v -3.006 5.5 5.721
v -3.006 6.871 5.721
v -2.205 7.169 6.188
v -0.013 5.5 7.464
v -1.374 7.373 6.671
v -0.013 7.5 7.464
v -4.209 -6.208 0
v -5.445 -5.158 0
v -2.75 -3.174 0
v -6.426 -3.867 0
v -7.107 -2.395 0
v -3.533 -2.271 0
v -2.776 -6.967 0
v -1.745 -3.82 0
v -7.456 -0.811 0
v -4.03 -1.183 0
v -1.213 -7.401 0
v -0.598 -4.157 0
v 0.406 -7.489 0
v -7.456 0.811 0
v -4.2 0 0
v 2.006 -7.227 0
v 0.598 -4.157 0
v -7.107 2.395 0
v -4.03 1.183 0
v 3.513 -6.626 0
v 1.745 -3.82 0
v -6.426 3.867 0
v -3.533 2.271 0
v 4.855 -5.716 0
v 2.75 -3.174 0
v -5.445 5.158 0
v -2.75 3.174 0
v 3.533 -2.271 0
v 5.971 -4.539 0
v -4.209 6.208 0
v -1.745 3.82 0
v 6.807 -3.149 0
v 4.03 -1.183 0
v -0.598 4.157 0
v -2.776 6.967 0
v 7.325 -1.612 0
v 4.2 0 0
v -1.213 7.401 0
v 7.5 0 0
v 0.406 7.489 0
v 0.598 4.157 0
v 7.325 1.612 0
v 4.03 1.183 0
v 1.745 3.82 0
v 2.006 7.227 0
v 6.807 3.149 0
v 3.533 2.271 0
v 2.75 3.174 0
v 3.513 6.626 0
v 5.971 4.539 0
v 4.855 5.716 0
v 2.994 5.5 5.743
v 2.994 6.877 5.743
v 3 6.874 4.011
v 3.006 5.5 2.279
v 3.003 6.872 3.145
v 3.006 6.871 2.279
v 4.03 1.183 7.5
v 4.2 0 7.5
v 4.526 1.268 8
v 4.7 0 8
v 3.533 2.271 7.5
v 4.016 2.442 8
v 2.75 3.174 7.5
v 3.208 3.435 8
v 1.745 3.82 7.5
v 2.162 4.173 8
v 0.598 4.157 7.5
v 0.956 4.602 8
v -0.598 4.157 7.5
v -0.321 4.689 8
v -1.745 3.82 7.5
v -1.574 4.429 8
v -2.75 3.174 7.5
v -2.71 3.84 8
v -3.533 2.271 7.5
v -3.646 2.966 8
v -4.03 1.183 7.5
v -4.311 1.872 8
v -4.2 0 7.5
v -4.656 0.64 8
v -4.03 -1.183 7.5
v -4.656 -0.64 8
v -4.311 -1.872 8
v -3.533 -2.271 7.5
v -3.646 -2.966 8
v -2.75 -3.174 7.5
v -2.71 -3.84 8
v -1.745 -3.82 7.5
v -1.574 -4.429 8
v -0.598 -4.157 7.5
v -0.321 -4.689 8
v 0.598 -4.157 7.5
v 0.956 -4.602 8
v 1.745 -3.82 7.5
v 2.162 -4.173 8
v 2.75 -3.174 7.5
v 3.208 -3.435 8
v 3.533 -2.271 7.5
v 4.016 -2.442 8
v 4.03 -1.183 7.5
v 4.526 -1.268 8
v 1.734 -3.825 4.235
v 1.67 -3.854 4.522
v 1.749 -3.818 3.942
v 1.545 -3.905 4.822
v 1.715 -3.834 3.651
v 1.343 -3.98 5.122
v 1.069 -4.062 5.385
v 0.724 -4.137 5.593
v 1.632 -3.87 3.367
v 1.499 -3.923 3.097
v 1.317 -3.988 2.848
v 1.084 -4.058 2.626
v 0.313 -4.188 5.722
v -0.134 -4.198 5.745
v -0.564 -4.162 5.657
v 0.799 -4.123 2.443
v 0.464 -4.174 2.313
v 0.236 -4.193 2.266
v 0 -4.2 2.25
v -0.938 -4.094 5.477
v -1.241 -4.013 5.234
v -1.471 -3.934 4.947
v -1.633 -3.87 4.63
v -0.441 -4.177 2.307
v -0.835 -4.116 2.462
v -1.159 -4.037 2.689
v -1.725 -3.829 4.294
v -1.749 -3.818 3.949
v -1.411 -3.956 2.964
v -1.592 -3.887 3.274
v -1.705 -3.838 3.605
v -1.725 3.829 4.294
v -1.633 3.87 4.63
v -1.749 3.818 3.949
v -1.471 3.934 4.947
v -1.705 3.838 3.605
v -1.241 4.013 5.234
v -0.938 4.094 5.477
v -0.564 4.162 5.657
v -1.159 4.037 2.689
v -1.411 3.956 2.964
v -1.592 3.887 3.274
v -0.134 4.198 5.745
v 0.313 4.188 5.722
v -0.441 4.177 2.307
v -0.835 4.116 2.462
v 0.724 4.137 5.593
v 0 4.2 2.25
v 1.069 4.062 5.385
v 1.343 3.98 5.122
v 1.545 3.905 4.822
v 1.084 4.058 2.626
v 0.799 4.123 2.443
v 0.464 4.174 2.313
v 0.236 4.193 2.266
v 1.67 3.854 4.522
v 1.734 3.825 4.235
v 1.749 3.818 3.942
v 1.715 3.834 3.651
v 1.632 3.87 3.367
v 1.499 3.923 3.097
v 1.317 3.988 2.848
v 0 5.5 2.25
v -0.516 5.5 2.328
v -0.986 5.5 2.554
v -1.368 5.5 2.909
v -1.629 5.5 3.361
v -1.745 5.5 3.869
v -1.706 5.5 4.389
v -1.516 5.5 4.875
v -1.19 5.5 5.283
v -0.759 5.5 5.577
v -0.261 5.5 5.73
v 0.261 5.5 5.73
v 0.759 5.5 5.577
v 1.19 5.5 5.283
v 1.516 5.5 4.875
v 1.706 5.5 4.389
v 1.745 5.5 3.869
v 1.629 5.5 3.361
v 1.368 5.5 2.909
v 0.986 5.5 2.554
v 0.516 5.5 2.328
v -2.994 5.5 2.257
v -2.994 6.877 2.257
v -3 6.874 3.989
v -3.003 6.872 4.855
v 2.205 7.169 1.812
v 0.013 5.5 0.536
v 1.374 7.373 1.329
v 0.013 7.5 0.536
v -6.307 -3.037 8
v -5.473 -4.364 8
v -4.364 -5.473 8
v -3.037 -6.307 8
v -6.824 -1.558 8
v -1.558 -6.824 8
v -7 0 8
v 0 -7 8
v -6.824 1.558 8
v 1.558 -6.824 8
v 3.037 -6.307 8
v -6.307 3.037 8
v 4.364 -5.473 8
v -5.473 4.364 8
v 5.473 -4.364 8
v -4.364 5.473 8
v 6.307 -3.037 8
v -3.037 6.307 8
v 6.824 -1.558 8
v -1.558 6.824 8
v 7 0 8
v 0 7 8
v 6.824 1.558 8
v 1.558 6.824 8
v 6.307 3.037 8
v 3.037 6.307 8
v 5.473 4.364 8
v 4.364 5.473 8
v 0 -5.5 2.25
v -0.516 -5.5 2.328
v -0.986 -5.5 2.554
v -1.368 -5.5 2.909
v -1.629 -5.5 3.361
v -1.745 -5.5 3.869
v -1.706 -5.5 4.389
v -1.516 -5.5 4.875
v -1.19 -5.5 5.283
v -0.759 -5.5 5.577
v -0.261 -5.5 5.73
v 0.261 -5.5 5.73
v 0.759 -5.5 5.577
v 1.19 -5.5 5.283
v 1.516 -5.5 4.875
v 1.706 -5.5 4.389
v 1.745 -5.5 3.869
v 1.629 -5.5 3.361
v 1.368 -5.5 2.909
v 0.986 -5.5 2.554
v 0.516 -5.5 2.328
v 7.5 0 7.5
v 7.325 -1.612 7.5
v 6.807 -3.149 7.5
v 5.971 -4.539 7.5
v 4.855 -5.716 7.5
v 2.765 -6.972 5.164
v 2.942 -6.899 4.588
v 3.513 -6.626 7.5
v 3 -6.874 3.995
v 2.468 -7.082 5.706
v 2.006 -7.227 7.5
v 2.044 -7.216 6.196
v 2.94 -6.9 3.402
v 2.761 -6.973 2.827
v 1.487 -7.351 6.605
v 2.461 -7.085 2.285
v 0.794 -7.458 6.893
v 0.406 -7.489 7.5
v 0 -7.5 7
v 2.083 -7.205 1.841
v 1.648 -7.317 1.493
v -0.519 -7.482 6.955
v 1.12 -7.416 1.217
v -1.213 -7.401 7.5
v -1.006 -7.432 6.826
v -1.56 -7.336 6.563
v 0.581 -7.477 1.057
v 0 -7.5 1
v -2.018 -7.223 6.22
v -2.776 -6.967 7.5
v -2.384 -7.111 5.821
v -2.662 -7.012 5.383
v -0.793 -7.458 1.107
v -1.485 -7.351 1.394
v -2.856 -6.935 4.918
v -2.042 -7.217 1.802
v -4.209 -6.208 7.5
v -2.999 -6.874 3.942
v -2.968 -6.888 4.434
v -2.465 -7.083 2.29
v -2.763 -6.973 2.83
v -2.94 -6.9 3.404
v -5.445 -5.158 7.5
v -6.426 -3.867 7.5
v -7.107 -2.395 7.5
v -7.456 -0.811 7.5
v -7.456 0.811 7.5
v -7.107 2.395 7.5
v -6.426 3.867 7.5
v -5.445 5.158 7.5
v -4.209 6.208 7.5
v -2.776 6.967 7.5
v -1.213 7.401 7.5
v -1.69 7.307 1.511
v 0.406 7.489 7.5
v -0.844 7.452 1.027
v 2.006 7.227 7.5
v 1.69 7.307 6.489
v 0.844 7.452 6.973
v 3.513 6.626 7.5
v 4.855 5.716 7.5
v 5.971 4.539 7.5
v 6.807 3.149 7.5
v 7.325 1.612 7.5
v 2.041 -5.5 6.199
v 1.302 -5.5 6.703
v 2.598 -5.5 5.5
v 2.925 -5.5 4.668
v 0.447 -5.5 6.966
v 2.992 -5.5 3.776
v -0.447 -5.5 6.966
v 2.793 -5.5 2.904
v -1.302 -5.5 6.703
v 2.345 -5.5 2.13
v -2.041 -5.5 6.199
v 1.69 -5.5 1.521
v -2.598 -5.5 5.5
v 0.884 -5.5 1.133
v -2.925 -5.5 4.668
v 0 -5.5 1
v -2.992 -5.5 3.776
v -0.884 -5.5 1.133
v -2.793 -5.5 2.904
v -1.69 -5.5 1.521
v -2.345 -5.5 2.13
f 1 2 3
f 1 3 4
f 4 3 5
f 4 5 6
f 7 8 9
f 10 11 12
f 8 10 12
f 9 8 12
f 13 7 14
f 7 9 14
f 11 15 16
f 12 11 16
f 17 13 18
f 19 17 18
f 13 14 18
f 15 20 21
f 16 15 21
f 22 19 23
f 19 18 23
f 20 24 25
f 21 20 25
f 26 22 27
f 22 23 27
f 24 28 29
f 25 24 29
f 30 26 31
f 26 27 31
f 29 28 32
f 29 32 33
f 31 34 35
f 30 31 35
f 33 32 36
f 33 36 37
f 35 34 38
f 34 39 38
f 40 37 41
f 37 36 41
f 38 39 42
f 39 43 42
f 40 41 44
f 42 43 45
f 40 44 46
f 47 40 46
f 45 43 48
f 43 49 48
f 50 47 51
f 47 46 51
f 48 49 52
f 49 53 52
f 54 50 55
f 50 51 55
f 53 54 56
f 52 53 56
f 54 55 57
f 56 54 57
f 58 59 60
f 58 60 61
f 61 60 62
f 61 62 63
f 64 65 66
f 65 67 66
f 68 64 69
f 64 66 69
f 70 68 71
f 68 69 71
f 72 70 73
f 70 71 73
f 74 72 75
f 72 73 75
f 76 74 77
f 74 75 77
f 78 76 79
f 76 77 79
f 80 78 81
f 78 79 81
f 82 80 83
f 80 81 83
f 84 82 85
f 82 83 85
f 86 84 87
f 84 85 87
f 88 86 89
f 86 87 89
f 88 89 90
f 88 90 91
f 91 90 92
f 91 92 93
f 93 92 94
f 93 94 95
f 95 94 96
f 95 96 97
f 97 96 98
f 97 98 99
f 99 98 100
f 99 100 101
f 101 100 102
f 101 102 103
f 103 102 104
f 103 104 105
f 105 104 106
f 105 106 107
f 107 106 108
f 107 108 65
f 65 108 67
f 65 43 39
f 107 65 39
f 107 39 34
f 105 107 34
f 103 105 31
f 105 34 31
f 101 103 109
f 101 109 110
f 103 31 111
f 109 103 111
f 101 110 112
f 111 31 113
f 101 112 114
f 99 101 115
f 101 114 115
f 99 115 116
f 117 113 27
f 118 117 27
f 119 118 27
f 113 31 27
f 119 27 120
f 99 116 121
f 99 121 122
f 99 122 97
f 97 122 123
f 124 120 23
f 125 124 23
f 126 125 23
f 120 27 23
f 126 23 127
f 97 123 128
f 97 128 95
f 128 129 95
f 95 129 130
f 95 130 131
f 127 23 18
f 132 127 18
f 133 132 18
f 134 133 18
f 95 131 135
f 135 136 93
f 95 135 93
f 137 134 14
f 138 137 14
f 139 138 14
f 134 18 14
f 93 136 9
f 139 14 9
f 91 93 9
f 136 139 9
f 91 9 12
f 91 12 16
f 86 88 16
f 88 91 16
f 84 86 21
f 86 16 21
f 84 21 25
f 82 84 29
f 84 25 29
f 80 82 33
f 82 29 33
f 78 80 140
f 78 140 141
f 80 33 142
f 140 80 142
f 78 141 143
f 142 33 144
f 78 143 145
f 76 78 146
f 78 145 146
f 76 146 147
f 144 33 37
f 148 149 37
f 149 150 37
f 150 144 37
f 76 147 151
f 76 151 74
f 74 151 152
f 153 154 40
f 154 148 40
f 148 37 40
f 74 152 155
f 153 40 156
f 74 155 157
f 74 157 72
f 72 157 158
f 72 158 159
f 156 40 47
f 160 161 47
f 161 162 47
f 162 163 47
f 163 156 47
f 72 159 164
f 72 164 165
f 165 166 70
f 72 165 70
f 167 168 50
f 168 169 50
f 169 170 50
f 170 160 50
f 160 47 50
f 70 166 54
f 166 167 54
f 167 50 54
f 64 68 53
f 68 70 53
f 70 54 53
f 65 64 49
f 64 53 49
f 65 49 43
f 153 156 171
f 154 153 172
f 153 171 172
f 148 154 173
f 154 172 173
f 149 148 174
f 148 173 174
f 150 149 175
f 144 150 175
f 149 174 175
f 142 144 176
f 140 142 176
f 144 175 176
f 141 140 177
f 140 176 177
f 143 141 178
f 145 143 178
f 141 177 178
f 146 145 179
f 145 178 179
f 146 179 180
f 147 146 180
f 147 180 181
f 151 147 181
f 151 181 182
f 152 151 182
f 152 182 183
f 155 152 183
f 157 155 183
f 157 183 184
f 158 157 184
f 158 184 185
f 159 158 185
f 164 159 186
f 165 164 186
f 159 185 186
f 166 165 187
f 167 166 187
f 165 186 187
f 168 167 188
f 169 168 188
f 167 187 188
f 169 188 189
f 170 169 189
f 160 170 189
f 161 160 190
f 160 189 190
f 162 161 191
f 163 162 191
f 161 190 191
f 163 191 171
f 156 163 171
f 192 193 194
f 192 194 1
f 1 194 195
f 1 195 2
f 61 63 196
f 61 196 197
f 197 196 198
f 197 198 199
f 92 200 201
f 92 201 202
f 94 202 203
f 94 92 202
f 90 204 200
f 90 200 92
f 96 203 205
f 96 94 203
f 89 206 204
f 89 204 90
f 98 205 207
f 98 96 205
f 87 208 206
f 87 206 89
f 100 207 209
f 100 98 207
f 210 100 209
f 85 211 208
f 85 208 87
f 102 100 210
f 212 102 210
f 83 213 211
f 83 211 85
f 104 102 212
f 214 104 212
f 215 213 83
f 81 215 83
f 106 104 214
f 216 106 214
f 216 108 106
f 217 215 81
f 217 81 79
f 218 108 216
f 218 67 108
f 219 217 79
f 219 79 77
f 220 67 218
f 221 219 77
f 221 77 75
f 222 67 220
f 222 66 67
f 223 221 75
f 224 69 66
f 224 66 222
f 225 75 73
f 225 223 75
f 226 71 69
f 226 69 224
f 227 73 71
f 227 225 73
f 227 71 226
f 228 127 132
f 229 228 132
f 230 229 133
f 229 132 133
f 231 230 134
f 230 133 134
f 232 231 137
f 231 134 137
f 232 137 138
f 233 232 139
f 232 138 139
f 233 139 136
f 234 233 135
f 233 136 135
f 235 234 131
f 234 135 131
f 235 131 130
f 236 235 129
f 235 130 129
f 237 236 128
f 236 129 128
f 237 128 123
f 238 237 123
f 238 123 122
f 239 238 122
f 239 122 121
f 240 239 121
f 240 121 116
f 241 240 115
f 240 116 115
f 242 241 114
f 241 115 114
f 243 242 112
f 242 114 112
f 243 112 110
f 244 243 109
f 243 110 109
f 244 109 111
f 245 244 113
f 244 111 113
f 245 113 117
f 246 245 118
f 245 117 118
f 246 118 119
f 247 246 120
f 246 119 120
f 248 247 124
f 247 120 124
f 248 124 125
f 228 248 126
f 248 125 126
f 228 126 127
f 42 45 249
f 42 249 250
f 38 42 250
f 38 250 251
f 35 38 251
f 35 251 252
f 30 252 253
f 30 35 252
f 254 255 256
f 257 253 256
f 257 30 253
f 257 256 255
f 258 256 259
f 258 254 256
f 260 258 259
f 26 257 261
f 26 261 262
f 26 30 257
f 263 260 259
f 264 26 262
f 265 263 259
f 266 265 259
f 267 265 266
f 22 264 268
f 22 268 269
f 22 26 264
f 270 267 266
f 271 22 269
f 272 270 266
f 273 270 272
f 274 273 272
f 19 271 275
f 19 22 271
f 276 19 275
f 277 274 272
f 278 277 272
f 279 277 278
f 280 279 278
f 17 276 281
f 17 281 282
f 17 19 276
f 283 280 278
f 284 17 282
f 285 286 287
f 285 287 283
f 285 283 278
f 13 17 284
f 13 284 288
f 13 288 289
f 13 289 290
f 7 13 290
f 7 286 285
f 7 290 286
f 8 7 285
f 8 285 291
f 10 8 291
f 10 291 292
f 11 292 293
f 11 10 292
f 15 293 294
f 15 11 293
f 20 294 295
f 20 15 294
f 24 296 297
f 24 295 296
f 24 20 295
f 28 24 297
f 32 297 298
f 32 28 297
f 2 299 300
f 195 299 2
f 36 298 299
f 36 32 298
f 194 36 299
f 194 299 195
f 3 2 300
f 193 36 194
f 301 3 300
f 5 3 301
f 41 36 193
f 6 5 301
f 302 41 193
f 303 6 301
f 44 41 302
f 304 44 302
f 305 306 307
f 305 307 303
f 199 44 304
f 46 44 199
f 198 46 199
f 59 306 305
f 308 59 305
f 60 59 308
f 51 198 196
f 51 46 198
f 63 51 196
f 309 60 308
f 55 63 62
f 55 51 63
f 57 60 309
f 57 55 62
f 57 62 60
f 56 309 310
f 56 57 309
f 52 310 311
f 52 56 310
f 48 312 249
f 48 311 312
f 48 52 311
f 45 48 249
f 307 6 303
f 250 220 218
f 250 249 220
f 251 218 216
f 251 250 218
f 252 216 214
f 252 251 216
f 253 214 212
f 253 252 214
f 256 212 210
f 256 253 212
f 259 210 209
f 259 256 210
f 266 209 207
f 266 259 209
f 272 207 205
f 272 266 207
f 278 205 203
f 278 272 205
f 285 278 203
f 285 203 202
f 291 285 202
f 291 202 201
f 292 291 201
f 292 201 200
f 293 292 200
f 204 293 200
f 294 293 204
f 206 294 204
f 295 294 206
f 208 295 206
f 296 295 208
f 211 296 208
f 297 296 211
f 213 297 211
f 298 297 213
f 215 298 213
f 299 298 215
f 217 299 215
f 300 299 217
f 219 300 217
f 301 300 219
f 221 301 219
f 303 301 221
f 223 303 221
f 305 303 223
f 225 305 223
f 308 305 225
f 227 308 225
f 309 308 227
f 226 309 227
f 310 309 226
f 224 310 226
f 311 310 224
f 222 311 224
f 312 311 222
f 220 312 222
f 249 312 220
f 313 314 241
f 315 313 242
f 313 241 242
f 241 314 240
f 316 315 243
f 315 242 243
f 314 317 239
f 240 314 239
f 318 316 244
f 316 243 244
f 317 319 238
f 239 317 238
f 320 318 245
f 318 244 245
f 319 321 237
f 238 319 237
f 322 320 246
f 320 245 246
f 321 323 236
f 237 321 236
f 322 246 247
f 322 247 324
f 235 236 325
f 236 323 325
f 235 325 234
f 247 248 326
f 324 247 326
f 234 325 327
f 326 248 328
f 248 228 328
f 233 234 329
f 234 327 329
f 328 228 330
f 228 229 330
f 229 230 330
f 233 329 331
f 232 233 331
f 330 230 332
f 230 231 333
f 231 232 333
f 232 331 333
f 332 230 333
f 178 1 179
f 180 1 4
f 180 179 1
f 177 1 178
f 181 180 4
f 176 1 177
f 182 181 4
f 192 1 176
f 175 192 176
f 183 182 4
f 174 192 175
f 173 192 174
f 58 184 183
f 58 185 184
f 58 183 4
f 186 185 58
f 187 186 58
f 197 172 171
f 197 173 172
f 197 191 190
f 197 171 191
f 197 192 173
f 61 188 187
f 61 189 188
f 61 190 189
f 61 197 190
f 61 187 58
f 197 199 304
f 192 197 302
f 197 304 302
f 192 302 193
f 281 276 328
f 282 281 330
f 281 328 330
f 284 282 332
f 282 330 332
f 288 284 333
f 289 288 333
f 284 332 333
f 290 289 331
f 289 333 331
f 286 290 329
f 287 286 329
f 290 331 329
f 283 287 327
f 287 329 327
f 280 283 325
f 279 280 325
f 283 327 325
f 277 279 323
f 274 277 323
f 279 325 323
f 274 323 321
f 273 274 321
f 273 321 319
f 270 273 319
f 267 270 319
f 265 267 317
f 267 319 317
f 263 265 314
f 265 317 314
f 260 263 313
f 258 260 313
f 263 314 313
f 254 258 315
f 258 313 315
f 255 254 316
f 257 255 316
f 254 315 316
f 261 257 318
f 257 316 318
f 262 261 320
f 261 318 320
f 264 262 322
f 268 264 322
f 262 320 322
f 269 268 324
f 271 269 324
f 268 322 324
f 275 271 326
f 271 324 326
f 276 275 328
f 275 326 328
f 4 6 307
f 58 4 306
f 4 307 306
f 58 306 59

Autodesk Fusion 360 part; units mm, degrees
sketch "Esquisse1" plane through (0, 0, 0) normal (0, 0, 1) x (1, 0, 0)
  circle A0 centre (0, 0) radius 4.2
  circle A1 centre (0, 0) radius 7.5
  dimension "d1" = 8.4
  dimension "d2" = 15
extrude "Extrusion1" add sketch "Esquisse1" along normal blind 8
hole "Perçage1" at (0, -7.5, 4) direction (0, 1, 0) diameter 3.5 depth 15 tip angle 180 counterbore diameter 6 counterbore depth 2
ref_plane "Plan de construction1" through (0, 7.5, 0) normal (0, 1, 0) x (0, 0, 1)
sketch "Esquisse2" plane through (0, 7.5, 0) normal (0, 1, 0) x (1, 0, 0)
  line L0 (-2.9935, -2.2568) -> (-3.0064, -5.7209)
  line L1 (-3.0064, -5.7209) -> (-0.0129, -7.4641)
  line L2 (-0.0129, -7.4641) -> (2.9935, -5.7432)
  line L3 (2.9935, -5.7432) -> (3.0064, -2.2791)
  line L4 (3.0064, -2.2791) -> (0.0129, -0.5359)
  line L5 (0.0129, -0.5359) -> (-2.9935, -2.2568)
  point P0 (0, -4)
  dimension "d12" = 3
extrude "Extrusion2" cut sketch "Esquisse2" against normal blind 2
chamfer "Chanfrein1" distance 0.5 angle 45 1 edges at (-3.9158, 1.5188, 8)
chamfer "Chanfrein2" distance 0.5 angle 45 1 edges at (-6.9925, -2.7121, 8)
